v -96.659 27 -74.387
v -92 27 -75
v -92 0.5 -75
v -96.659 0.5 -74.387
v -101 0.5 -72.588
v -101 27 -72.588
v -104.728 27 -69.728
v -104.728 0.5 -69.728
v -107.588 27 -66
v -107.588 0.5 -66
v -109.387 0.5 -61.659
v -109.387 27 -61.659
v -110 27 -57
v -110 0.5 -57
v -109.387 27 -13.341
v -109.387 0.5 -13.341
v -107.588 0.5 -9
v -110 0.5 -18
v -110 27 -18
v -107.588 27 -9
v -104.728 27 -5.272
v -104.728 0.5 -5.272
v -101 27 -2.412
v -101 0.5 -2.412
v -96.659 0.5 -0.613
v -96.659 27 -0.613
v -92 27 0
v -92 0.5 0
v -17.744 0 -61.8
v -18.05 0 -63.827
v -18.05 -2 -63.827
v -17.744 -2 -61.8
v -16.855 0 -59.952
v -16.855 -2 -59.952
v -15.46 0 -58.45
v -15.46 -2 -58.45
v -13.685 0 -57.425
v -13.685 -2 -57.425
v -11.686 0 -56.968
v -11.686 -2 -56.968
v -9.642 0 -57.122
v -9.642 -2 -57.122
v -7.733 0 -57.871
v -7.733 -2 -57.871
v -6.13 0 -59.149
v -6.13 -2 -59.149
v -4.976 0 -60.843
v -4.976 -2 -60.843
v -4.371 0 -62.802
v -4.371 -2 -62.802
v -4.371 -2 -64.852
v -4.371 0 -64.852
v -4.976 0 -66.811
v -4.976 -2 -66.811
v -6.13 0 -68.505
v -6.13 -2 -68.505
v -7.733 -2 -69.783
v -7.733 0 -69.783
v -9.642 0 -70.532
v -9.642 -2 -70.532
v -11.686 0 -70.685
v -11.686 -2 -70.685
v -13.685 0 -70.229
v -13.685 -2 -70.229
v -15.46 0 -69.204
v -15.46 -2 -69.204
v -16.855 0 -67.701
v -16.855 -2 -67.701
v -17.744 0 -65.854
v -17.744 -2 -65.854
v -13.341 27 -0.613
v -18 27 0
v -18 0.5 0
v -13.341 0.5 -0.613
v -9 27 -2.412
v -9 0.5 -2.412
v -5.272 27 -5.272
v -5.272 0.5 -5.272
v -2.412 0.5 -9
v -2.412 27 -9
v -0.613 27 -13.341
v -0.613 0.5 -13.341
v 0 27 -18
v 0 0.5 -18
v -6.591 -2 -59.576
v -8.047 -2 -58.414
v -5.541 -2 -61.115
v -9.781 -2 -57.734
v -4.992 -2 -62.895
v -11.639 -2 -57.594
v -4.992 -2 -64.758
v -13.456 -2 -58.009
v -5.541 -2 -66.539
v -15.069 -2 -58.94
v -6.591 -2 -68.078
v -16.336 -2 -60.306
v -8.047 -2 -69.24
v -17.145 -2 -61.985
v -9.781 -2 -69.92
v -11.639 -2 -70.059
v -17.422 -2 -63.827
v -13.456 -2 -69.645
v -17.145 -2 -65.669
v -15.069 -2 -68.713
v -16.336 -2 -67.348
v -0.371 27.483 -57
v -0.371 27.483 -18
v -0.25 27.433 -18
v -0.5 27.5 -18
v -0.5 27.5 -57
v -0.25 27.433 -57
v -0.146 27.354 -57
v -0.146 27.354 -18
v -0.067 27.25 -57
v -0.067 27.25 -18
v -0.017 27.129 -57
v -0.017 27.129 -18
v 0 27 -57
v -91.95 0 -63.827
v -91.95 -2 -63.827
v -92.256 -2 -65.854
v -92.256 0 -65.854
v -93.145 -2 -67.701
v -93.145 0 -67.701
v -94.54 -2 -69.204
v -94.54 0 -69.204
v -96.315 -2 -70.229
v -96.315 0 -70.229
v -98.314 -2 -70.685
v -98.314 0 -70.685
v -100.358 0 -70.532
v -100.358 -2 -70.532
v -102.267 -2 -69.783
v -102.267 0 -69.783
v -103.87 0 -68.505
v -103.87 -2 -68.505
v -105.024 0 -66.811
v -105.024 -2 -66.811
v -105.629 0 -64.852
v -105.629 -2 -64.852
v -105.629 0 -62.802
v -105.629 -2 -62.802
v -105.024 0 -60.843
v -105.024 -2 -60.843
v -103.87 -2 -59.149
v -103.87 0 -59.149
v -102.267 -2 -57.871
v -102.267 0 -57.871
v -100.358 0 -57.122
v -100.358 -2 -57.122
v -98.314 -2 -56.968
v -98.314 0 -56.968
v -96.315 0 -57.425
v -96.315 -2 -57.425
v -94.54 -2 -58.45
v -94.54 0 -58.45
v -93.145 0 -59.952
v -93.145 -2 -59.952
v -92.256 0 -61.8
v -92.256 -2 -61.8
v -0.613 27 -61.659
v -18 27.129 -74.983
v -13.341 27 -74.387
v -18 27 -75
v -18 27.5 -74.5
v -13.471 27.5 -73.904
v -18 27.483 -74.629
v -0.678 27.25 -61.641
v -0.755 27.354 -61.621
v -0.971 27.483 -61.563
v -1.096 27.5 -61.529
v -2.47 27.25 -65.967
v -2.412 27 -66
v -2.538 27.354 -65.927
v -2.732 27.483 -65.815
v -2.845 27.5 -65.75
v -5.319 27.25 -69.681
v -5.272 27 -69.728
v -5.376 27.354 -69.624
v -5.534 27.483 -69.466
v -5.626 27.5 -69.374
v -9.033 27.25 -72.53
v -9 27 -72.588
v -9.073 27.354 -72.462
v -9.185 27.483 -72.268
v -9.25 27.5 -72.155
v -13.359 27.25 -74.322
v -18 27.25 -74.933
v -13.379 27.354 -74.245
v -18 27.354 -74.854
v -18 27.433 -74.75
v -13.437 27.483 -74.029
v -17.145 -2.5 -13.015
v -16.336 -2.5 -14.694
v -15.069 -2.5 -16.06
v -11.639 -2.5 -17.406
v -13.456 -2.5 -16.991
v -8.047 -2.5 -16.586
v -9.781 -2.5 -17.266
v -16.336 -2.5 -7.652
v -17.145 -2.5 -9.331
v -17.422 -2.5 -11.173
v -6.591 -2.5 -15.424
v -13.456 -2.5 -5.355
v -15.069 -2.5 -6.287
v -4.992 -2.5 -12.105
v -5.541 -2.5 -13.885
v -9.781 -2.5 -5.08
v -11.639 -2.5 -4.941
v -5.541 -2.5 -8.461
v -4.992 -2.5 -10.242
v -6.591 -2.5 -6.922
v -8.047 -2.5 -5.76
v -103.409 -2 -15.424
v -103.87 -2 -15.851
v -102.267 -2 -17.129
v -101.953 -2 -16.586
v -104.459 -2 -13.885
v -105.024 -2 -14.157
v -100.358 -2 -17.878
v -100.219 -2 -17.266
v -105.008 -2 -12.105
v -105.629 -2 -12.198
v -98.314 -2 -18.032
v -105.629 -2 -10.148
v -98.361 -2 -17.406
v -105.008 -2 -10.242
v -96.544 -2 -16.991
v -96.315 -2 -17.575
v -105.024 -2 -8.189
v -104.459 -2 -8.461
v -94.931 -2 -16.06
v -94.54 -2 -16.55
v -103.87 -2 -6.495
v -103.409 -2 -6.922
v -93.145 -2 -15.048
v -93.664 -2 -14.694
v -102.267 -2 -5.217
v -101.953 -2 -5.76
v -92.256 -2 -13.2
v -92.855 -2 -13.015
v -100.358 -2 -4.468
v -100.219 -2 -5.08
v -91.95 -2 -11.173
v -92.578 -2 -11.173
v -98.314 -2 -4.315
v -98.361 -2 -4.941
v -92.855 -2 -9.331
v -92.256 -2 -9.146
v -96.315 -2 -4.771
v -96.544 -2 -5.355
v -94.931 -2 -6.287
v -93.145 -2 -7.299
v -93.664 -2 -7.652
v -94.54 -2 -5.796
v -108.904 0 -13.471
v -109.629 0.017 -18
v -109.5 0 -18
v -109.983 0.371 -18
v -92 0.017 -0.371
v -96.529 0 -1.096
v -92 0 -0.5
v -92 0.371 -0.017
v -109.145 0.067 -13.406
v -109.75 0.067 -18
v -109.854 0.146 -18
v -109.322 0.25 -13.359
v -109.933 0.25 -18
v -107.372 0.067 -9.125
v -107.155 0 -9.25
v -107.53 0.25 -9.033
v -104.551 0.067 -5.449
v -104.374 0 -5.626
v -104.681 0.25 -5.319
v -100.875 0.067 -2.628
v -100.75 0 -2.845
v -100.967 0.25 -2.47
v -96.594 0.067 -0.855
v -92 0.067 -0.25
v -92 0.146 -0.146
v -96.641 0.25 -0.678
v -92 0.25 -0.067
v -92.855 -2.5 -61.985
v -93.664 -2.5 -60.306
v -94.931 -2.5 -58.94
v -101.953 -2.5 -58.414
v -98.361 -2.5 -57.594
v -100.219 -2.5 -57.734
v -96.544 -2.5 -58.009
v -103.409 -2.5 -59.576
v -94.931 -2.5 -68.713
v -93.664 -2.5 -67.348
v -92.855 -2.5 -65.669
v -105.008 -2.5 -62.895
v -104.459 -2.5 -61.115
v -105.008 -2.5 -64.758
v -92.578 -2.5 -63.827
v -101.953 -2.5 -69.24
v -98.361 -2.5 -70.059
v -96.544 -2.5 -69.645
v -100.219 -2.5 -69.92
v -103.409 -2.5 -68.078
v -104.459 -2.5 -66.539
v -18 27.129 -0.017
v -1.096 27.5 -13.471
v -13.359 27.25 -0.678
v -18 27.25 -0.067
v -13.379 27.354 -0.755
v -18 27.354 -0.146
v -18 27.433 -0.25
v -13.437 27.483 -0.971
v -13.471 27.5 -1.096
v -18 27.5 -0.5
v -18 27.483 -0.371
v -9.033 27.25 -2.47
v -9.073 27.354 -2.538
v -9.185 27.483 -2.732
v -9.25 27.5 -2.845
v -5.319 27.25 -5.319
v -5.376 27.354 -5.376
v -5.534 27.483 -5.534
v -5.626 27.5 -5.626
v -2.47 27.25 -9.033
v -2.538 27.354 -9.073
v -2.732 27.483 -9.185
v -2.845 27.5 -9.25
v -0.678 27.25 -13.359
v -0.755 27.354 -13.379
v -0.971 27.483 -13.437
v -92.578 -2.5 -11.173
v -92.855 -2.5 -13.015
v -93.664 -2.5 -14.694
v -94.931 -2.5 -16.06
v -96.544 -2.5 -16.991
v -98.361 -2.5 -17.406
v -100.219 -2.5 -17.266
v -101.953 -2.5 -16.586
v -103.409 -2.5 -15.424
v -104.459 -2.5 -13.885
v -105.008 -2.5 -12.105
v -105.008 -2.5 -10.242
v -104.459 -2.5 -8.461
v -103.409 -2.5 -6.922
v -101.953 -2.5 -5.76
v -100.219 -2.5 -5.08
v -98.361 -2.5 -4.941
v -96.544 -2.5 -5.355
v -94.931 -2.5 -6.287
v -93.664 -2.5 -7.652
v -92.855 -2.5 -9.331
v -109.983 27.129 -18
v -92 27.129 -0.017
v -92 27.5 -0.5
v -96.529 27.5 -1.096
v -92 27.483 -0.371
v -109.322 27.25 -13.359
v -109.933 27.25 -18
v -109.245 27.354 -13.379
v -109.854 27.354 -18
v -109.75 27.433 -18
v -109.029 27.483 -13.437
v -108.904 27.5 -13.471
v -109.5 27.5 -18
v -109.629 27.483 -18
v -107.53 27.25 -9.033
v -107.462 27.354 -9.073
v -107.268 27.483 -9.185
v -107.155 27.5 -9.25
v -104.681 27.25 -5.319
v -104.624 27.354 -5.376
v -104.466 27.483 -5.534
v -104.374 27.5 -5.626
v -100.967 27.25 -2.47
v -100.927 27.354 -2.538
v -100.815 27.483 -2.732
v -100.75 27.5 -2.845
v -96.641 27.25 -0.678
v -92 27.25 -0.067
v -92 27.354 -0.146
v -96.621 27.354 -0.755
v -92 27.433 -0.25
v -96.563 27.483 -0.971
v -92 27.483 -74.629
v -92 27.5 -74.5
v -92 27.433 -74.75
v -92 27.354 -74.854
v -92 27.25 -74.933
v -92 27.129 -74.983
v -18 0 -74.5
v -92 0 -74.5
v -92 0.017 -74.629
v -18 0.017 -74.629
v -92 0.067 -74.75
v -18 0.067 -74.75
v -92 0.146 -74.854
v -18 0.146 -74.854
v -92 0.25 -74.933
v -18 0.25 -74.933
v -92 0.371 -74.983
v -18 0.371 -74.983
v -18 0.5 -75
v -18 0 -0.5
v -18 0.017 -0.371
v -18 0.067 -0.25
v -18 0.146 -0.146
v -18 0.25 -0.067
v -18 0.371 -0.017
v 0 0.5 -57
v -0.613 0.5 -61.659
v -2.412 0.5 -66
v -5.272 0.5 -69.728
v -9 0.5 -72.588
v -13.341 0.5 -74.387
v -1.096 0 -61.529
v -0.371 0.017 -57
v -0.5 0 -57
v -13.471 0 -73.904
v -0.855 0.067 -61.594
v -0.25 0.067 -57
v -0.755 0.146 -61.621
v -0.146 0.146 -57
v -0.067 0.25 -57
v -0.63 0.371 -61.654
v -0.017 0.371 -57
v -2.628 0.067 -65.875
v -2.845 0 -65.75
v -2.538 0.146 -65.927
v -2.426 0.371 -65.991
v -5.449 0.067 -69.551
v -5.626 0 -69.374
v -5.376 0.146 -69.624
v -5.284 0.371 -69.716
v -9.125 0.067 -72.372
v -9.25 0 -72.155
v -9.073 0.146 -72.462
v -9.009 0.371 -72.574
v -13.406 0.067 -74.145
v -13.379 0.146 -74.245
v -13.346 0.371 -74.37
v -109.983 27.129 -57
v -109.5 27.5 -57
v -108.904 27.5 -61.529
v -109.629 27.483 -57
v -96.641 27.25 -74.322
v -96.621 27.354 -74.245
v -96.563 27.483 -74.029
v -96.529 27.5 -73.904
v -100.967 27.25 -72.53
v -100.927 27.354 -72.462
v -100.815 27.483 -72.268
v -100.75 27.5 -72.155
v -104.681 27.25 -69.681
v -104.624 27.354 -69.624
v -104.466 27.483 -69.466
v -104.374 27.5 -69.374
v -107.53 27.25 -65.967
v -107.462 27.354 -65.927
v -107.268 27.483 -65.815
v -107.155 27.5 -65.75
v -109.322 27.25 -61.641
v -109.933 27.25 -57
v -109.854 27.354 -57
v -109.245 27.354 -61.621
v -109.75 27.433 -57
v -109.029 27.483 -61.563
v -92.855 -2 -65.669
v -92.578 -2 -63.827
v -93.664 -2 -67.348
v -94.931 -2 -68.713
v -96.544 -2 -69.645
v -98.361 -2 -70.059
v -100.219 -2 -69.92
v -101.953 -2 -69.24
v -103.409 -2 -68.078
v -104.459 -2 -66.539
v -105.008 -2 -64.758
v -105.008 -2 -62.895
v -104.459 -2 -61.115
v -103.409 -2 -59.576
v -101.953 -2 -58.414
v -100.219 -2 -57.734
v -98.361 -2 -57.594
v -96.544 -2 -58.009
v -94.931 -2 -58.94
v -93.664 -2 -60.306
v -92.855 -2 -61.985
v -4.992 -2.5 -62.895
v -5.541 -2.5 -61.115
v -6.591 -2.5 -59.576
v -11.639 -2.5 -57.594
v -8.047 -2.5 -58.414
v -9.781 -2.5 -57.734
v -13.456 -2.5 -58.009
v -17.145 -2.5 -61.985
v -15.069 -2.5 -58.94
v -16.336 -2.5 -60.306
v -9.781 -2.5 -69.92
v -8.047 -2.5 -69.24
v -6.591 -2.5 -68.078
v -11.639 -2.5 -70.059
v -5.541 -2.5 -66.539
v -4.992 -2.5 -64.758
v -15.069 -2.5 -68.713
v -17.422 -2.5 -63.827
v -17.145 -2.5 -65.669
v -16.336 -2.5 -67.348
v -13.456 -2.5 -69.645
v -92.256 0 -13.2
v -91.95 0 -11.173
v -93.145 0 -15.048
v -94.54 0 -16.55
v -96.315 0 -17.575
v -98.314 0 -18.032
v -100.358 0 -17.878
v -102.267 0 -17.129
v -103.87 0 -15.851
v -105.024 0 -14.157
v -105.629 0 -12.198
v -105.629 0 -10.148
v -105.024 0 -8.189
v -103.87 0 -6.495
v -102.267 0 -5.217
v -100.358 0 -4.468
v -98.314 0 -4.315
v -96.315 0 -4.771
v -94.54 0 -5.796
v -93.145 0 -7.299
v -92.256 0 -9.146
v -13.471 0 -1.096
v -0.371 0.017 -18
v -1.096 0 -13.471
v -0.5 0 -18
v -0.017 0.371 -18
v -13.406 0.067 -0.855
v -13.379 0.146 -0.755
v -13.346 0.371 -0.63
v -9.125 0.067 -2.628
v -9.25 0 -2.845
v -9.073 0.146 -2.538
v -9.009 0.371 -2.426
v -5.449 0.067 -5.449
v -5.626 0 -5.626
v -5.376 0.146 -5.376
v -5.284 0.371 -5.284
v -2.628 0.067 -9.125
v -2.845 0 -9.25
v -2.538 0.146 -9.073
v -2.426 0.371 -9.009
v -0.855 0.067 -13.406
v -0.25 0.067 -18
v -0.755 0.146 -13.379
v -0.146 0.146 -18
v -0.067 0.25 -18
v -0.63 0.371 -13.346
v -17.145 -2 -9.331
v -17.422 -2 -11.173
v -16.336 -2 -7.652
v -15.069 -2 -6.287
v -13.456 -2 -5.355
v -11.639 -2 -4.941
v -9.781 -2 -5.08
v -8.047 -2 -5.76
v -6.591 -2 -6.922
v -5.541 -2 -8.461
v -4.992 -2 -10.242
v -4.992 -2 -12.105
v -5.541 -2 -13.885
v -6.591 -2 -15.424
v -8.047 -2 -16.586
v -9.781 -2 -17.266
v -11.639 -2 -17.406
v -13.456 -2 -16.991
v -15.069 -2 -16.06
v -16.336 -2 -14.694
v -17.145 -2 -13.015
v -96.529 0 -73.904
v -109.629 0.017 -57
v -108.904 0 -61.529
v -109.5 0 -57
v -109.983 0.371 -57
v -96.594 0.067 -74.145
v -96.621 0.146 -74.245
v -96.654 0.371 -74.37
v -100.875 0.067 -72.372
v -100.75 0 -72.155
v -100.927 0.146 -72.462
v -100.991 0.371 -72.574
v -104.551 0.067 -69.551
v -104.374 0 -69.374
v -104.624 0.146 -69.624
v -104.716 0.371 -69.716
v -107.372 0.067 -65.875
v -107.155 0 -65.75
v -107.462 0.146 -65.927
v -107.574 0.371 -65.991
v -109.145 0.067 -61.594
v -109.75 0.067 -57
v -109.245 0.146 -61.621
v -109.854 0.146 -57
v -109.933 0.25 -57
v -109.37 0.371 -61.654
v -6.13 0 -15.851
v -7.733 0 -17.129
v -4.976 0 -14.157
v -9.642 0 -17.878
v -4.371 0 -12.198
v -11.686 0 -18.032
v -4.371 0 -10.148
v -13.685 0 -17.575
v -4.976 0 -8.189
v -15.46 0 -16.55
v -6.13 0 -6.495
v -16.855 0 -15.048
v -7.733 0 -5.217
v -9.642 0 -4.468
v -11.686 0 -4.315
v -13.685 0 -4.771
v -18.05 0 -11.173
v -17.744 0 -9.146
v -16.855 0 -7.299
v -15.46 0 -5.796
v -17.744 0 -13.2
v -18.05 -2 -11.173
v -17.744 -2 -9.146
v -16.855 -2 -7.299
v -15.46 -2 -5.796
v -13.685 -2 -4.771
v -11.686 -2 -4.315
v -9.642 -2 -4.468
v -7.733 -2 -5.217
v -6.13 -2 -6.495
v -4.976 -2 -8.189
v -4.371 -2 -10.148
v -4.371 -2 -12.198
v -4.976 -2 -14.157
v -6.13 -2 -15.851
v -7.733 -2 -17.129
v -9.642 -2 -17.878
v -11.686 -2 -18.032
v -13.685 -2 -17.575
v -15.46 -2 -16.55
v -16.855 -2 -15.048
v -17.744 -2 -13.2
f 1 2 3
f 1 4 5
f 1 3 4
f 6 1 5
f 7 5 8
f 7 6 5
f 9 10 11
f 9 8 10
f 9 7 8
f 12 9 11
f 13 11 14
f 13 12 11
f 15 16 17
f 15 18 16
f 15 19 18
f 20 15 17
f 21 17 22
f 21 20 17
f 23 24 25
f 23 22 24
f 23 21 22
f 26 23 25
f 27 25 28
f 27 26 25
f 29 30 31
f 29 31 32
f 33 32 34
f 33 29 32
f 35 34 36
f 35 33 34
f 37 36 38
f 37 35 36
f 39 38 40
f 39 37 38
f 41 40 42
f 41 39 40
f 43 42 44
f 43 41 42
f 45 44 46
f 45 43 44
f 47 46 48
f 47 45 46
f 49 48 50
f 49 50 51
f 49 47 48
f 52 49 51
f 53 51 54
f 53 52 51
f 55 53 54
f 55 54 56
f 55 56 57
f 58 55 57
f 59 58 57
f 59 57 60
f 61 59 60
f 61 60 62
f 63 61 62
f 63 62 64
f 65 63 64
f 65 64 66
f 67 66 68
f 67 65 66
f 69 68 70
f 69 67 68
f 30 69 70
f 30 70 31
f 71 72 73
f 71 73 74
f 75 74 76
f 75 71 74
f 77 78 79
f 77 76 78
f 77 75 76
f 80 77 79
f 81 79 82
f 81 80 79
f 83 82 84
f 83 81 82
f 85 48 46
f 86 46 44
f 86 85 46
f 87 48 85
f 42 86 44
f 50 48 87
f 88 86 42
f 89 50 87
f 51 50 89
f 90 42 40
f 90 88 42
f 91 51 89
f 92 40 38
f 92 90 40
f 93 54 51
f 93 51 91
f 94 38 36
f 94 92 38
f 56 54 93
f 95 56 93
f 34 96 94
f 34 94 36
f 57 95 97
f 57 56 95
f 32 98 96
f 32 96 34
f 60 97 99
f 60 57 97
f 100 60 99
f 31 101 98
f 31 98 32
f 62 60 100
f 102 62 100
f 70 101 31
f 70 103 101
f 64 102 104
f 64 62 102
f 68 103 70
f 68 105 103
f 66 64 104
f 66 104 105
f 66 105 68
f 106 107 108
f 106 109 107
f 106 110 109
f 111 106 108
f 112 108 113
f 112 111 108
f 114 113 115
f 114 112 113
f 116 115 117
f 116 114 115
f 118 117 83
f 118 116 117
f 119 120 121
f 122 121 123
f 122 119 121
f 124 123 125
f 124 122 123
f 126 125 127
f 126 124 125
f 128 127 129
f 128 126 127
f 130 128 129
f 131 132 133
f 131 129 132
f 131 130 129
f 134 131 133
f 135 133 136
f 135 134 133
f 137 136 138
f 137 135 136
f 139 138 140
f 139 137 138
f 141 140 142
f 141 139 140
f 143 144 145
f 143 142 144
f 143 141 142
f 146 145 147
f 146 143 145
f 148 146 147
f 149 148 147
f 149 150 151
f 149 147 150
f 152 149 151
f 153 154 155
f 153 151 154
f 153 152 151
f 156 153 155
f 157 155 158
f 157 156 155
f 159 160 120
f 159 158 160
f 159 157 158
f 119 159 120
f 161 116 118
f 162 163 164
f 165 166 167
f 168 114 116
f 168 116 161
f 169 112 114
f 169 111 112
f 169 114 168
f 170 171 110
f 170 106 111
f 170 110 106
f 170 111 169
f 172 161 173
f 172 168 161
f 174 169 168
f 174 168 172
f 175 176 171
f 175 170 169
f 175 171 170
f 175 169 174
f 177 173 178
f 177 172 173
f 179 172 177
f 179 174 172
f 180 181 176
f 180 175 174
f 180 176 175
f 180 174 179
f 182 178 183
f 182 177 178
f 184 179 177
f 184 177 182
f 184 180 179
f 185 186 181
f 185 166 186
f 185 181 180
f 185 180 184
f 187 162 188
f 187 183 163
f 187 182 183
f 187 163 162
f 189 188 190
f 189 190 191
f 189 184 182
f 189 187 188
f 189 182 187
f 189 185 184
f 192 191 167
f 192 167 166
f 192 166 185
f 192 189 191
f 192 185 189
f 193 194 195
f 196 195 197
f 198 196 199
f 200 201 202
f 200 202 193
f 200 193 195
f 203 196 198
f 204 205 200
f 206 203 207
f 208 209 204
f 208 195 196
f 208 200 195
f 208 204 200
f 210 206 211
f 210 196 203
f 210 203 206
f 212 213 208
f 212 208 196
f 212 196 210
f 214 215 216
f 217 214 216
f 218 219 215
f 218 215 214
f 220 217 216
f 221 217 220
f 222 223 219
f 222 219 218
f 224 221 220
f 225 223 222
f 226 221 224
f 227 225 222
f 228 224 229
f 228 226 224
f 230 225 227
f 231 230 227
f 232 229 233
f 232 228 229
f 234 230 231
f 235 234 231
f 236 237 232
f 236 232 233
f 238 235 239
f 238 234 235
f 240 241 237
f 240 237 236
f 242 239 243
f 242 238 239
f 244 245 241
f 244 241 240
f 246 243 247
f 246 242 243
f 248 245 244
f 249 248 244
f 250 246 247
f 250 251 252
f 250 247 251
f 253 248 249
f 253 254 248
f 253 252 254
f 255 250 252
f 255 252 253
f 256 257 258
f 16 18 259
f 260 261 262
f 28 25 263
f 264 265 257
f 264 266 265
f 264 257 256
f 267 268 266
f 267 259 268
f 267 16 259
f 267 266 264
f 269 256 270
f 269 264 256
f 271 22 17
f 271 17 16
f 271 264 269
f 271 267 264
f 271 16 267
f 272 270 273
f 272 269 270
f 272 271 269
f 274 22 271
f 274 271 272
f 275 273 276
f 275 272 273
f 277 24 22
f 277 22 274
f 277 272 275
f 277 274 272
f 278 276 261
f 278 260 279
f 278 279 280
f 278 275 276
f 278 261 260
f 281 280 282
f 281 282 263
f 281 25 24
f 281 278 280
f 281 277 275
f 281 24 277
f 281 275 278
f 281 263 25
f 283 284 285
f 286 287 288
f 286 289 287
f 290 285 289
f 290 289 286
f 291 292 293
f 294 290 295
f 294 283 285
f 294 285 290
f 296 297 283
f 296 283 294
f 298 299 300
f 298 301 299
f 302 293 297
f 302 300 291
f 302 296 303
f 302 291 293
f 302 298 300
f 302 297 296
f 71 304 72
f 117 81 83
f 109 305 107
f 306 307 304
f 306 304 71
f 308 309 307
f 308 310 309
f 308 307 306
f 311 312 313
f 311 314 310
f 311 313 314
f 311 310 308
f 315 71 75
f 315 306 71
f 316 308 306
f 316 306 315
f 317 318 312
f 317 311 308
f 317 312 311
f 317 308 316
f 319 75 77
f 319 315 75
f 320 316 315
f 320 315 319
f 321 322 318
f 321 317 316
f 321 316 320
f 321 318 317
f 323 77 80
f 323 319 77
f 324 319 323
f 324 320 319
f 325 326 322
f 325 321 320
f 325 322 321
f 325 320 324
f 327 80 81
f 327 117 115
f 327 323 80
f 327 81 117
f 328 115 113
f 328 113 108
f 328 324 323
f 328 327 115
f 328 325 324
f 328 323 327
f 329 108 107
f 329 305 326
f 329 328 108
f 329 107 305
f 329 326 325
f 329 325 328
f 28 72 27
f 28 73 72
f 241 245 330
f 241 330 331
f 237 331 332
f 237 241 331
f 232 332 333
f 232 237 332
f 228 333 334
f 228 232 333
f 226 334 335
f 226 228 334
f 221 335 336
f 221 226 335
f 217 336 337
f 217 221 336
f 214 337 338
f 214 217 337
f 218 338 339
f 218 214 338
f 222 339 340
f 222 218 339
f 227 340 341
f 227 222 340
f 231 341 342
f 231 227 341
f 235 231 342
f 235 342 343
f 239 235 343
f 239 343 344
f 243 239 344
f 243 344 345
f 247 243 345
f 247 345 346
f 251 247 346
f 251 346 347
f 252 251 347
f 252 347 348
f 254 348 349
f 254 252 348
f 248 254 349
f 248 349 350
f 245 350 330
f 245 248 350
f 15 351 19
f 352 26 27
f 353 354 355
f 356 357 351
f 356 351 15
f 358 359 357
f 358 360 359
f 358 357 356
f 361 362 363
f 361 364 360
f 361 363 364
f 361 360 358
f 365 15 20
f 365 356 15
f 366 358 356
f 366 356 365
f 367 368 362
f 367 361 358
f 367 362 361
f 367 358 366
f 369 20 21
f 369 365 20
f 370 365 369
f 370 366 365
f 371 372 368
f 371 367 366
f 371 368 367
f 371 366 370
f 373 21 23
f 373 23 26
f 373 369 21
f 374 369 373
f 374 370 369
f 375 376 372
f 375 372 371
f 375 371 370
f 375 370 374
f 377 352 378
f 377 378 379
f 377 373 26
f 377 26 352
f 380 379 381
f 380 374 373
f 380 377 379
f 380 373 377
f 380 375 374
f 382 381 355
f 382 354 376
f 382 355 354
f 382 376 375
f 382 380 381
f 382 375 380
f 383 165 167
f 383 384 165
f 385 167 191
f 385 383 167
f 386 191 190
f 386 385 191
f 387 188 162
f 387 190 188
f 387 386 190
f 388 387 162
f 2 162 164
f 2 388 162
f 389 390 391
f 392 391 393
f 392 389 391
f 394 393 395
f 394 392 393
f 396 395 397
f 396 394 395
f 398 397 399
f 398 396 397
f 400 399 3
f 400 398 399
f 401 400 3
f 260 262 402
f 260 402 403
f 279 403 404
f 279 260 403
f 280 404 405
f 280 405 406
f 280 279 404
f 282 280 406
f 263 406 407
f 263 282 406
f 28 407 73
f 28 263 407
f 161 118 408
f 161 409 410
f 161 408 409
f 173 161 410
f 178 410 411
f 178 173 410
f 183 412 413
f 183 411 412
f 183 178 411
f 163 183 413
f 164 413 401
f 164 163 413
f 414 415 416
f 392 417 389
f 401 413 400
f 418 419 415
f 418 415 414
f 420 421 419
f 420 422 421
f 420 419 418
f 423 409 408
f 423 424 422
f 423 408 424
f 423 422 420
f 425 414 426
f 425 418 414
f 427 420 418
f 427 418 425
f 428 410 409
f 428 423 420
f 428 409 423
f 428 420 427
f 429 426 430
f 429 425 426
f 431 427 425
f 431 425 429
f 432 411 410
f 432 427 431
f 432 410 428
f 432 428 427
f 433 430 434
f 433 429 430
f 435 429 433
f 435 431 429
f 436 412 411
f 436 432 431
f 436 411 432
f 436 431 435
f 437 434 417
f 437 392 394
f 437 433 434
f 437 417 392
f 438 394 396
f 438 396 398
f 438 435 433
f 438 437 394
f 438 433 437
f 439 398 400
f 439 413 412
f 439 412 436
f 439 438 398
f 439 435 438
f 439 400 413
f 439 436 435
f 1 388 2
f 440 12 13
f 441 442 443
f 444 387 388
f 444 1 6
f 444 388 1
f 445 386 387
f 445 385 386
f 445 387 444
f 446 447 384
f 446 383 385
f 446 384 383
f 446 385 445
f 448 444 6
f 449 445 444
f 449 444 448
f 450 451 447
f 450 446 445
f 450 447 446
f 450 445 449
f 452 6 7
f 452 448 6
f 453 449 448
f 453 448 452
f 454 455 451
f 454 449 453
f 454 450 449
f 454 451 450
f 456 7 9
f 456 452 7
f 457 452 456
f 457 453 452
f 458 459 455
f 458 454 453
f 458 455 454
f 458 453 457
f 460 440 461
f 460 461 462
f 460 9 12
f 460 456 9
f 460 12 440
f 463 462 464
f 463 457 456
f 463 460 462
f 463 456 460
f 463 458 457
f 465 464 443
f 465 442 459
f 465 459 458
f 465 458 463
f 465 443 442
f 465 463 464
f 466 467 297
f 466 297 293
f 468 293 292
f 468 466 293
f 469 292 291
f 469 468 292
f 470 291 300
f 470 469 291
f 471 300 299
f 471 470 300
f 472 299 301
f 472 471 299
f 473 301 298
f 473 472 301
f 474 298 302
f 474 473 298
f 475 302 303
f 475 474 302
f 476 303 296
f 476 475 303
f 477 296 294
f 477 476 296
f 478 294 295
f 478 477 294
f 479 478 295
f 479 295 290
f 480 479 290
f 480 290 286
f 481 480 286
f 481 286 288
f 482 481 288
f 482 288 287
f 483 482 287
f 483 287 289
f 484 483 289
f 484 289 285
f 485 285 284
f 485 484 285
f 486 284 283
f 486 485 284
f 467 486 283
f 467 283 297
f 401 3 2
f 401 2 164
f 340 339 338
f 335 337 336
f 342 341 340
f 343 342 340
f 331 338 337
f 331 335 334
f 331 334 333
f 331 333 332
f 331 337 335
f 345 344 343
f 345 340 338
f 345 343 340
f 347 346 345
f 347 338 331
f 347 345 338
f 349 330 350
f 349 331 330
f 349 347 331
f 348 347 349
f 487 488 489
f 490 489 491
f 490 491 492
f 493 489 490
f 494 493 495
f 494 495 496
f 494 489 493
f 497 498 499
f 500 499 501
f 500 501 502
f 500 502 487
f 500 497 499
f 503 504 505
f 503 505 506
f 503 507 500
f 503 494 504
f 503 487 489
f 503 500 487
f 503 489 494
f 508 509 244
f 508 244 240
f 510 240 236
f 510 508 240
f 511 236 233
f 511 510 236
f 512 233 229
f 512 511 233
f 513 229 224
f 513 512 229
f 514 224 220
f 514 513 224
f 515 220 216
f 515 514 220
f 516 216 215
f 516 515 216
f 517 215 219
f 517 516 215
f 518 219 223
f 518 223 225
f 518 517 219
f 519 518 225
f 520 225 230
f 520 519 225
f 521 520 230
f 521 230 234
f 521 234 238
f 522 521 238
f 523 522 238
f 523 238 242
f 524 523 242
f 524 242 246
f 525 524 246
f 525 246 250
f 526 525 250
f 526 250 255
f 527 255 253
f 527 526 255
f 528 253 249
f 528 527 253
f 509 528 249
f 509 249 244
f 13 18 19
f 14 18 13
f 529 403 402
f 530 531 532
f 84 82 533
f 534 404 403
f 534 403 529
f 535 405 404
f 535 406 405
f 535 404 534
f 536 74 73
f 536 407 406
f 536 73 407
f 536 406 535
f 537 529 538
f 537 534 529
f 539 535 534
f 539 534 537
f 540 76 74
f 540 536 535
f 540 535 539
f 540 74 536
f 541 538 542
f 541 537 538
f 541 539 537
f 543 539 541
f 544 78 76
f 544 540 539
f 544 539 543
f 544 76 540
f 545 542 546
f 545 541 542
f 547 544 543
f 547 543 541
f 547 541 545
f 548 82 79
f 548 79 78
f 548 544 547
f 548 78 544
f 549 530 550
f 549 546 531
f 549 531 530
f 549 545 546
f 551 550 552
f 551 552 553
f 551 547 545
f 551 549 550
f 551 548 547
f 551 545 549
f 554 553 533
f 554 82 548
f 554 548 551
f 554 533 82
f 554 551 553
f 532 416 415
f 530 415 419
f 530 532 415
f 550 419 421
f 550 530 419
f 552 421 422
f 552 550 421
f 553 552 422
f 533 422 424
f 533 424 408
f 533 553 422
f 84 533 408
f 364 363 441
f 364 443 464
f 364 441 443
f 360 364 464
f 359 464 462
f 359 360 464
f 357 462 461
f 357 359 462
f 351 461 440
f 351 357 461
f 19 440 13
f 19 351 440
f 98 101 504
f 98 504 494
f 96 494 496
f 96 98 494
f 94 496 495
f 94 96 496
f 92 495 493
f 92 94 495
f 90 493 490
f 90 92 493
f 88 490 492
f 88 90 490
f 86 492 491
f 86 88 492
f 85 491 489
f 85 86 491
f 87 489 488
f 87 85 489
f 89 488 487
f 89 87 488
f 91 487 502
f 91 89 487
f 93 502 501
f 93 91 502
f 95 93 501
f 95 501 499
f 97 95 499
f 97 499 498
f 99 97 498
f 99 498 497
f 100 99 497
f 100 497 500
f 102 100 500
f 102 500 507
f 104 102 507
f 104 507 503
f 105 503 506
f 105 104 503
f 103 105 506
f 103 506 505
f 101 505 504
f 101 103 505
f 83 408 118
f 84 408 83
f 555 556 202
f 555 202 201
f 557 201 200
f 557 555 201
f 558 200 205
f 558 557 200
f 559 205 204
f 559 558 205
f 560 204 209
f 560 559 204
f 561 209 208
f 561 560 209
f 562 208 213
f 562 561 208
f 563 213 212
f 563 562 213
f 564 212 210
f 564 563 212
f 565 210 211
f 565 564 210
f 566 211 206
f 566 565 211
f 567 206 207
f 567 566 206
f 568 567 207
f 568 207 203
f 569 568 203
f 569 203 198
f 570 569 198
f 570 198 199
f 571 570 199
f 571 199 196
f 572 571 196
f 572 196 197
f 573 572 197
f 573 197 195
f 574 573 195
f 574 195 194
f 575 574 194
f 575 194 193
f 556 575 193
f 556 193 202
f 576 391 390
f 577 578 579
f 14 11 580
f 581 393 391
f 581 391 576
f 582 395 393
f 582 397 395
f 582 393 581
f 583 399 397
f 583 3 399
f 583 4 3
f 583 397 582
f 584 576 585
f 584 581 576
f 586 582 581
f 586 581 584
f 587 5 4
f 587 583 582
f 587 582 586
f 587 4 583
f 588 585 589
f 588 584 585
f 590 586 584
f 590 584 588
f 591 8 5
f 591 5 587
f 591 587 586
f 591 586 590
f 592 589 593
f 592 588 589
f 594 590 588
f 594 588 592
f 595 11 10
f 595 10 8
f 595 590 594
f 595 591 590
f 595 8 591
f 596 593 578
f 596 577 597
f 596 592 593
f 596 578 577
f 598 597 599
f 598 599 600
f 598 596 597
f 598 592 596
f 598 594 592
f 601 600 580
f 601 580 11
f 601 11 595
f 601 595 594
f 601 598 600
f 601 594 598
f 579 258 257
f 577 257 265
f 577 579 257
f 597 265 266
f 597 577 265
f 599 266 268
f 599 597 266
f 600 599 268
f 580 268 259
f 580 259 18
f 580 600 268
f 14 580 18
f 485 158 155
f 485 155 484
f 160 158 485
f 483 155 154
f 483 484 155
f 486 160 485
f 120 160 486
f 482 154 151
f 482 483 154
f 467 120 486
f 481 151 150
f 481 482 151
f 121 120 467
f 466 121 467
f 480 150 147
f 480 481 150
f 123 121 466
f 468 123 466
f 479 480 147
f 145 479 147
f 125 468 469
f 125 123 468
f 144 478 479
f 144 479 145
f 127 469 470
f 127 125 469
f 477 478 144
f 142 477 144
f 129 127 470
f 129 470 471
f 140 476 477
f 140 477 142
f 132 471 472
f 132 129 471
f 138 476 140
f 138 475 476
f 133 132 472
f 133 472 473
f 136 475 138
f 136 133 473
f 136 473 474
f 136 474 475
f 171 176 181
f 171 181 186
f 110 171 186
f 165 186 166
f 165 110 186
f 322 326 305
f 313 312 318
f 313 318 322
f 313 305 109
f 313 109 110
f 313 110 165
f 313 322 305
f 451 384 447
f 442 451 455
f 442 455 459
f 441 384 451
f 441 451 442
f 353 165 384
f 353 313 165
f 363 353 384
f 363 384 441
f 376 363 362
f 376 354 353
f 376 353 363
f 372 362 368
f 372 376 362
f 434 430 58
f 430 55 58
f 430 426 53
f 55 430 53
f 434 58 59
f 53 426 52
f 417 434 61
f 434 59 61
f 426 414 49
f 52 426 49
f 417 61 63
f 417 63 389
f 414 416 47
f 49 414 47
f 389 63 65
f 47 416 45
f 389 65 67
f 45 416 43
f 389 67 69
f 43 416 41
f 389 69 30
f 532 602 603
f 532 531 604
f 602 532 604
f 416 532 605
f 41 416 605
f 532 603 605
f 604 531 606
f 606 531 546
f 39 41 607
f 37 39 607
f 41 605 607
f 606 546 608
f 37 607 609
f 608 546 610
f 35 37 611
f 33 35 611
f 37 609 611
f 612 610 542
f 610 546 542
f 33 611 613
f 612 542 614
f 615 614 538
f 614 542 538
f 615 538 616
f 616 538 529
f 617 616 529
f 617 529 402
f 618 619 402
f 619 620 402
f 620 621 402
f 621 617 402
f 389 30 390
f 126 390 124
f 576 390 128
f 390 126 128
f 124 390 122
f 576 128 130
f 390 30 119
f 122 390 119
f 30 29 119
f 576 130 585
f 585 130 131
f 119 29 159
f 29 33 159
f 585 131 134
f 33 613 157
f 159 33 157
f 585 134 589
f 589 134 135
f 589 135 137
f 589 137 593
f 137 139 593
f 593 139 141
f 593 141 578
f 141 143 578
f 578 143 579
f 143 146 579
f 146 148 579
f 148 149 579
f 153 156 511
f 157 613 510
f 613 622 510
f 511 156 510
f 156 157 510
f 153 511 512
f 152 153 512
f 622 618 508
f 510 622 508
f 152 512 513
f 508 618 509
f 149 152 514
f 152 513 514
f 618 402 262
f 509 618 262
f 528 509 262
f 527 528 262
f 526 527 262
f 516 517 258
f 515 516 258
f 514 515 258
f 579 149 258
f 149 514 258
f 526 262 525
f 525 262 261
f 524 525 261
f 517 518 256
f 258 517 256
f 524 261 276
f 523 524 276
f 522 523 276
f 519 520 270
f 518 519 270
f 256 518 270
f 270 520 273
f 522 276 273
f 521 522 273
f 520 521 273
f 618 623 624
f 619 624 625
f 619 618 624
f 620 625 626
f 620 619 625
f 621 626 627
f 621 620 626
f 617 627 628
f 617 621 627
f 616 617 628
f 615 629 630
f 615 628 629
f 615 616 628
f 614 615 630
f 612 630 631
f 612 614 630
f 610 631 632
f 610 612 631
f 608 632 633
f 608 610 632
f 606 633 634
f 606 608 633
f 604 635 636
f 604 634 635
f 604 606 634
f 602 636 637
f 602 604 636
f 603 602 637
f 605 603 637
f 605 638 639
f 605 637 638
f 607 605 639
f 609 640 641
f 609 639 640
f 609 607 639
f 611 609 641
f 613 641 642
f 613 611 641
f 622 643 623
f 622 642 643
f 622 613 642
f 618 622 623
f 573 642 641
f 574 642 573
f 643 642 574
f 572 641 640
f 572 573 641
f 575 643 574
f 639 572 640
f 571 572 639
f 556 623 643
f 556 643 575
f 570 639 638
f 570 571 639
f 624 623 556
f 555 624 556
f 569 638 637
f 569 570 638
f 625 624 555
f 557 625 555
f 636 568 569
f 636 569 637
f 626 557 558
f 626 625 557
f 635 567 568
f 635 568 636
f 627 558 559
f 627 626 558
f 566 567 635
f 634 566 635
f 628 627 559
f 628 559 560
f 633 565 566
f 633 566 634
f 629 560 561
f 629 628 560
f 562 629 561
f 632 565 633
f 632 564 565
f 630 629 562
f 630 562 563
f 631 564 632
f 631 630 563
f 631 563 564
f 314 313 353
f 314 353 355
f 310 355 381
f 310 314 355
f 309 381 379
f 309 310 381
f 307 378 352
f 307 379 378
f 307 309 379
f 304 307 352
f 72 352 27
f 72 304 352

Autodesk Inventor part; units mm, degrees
ref_plane "YZ Plane" through (0, 0, 0) normal (1, 0, 0) x (0, 1, 0)
sketch "Sketch1" plane through (0, 0, 0) normal (0, 1, 0) x (-1, 0, 0)
  line L0 (0, 0) -> (110, 0)
  line L1 (110, 0) -> (110, -75)
  line L2 (110, -75) -> (0, -75)
  line L3 (0, -75) -> (0, 0)
  dimension "d0" = 110
  dimension "d1" = 75
extrude "Extrusion1" add sketch "Sketch1" along normal blind 27.5
fillet "Fillet1" radius 18 4 edges at (-110, 13.75, 0) (0, 13.75, 0) (0, 13.75, -75) (-110, 13.75, -75)
sketch "Sketch2" plane through (0, 0, 0) normal (0, -1, 0) x (1, 0, 0)
  line L0 (-110.0023, 0) -> (-0.0023, 0) construction
  line L1 (-0.0023, 0) -> (-0.0023, -81.8008) construction
  line L2 (-0.0023, -81.8008) -> (-110.0023, -81.8008) construction
  line L3 (-110.0023, -81.8008) -> (-110.0023, 0) construction
  arc A0 (-92, 0) -> (-110, -18) centre (-92, -18) ccw projected
  line L4 (-110.0023, 0) -> (-92, -18)
  circle A1 centre (-98.8278, -11.1731) radius 6.8778
  point P0 (0, 0)
  dimension "d14" = 110
extrude "Extrusion2" add sketch "Sketch2" along normal blind 2
sketch "Sketch3" plane through (-98.8278, -2, -11.1731) normal (0, -1, 0) x (1, 0, 0)
  circle A0 centre (0, 0) radius 6.25
  point P0 (98.8278, 11.1731)
  dimension "d28" = 12.5
extrude "Extrusion3" add sketch "Sketch3" along normal blind 0.5
ref_plane "Work Plane1" through (-92, 0, -37.5) normal (0, 0, 1) x (1, 0, 0)
ref_plane "Work Plane2" through (-55, 0, -18) normal (1, 0, 0) x (0, 0, -1)
mirror "Mirror1" about plane through (-92, 0, -37.5) normal (0, 0, 1) of "Extrusion2", "Extrusion3"
mirror "Mirror2" about plane through (-55, 0, -18) normal (1, 0, 0) of "Extrusion2", "Extrusion3", "Mirror1"
fillet "Fillet2" radius 0.5 16 edges at (-5.2721, 27.5, -5.2721) (0, 27.5, -37.5) (-5.2721, 27.5, -69.7279) (-55, 27.5, -75) (-104.7279, 27.5, -69.7279) (-110, 27.5, -37.5) (-104.7279, 27.5, -5.2721) (-55, 27.5, 0) (-104.7279, 0, -5.2721) (-110, 0, -37.5) (-104.7279, 0, -69.7279) (-55, 0, -75) (-5.2721, 0, -69.7279) (0, 0, -37.5) (-5.2721, 0, -5.2721) (-55, 0, 0)
properties part number "OM5P-AC"
